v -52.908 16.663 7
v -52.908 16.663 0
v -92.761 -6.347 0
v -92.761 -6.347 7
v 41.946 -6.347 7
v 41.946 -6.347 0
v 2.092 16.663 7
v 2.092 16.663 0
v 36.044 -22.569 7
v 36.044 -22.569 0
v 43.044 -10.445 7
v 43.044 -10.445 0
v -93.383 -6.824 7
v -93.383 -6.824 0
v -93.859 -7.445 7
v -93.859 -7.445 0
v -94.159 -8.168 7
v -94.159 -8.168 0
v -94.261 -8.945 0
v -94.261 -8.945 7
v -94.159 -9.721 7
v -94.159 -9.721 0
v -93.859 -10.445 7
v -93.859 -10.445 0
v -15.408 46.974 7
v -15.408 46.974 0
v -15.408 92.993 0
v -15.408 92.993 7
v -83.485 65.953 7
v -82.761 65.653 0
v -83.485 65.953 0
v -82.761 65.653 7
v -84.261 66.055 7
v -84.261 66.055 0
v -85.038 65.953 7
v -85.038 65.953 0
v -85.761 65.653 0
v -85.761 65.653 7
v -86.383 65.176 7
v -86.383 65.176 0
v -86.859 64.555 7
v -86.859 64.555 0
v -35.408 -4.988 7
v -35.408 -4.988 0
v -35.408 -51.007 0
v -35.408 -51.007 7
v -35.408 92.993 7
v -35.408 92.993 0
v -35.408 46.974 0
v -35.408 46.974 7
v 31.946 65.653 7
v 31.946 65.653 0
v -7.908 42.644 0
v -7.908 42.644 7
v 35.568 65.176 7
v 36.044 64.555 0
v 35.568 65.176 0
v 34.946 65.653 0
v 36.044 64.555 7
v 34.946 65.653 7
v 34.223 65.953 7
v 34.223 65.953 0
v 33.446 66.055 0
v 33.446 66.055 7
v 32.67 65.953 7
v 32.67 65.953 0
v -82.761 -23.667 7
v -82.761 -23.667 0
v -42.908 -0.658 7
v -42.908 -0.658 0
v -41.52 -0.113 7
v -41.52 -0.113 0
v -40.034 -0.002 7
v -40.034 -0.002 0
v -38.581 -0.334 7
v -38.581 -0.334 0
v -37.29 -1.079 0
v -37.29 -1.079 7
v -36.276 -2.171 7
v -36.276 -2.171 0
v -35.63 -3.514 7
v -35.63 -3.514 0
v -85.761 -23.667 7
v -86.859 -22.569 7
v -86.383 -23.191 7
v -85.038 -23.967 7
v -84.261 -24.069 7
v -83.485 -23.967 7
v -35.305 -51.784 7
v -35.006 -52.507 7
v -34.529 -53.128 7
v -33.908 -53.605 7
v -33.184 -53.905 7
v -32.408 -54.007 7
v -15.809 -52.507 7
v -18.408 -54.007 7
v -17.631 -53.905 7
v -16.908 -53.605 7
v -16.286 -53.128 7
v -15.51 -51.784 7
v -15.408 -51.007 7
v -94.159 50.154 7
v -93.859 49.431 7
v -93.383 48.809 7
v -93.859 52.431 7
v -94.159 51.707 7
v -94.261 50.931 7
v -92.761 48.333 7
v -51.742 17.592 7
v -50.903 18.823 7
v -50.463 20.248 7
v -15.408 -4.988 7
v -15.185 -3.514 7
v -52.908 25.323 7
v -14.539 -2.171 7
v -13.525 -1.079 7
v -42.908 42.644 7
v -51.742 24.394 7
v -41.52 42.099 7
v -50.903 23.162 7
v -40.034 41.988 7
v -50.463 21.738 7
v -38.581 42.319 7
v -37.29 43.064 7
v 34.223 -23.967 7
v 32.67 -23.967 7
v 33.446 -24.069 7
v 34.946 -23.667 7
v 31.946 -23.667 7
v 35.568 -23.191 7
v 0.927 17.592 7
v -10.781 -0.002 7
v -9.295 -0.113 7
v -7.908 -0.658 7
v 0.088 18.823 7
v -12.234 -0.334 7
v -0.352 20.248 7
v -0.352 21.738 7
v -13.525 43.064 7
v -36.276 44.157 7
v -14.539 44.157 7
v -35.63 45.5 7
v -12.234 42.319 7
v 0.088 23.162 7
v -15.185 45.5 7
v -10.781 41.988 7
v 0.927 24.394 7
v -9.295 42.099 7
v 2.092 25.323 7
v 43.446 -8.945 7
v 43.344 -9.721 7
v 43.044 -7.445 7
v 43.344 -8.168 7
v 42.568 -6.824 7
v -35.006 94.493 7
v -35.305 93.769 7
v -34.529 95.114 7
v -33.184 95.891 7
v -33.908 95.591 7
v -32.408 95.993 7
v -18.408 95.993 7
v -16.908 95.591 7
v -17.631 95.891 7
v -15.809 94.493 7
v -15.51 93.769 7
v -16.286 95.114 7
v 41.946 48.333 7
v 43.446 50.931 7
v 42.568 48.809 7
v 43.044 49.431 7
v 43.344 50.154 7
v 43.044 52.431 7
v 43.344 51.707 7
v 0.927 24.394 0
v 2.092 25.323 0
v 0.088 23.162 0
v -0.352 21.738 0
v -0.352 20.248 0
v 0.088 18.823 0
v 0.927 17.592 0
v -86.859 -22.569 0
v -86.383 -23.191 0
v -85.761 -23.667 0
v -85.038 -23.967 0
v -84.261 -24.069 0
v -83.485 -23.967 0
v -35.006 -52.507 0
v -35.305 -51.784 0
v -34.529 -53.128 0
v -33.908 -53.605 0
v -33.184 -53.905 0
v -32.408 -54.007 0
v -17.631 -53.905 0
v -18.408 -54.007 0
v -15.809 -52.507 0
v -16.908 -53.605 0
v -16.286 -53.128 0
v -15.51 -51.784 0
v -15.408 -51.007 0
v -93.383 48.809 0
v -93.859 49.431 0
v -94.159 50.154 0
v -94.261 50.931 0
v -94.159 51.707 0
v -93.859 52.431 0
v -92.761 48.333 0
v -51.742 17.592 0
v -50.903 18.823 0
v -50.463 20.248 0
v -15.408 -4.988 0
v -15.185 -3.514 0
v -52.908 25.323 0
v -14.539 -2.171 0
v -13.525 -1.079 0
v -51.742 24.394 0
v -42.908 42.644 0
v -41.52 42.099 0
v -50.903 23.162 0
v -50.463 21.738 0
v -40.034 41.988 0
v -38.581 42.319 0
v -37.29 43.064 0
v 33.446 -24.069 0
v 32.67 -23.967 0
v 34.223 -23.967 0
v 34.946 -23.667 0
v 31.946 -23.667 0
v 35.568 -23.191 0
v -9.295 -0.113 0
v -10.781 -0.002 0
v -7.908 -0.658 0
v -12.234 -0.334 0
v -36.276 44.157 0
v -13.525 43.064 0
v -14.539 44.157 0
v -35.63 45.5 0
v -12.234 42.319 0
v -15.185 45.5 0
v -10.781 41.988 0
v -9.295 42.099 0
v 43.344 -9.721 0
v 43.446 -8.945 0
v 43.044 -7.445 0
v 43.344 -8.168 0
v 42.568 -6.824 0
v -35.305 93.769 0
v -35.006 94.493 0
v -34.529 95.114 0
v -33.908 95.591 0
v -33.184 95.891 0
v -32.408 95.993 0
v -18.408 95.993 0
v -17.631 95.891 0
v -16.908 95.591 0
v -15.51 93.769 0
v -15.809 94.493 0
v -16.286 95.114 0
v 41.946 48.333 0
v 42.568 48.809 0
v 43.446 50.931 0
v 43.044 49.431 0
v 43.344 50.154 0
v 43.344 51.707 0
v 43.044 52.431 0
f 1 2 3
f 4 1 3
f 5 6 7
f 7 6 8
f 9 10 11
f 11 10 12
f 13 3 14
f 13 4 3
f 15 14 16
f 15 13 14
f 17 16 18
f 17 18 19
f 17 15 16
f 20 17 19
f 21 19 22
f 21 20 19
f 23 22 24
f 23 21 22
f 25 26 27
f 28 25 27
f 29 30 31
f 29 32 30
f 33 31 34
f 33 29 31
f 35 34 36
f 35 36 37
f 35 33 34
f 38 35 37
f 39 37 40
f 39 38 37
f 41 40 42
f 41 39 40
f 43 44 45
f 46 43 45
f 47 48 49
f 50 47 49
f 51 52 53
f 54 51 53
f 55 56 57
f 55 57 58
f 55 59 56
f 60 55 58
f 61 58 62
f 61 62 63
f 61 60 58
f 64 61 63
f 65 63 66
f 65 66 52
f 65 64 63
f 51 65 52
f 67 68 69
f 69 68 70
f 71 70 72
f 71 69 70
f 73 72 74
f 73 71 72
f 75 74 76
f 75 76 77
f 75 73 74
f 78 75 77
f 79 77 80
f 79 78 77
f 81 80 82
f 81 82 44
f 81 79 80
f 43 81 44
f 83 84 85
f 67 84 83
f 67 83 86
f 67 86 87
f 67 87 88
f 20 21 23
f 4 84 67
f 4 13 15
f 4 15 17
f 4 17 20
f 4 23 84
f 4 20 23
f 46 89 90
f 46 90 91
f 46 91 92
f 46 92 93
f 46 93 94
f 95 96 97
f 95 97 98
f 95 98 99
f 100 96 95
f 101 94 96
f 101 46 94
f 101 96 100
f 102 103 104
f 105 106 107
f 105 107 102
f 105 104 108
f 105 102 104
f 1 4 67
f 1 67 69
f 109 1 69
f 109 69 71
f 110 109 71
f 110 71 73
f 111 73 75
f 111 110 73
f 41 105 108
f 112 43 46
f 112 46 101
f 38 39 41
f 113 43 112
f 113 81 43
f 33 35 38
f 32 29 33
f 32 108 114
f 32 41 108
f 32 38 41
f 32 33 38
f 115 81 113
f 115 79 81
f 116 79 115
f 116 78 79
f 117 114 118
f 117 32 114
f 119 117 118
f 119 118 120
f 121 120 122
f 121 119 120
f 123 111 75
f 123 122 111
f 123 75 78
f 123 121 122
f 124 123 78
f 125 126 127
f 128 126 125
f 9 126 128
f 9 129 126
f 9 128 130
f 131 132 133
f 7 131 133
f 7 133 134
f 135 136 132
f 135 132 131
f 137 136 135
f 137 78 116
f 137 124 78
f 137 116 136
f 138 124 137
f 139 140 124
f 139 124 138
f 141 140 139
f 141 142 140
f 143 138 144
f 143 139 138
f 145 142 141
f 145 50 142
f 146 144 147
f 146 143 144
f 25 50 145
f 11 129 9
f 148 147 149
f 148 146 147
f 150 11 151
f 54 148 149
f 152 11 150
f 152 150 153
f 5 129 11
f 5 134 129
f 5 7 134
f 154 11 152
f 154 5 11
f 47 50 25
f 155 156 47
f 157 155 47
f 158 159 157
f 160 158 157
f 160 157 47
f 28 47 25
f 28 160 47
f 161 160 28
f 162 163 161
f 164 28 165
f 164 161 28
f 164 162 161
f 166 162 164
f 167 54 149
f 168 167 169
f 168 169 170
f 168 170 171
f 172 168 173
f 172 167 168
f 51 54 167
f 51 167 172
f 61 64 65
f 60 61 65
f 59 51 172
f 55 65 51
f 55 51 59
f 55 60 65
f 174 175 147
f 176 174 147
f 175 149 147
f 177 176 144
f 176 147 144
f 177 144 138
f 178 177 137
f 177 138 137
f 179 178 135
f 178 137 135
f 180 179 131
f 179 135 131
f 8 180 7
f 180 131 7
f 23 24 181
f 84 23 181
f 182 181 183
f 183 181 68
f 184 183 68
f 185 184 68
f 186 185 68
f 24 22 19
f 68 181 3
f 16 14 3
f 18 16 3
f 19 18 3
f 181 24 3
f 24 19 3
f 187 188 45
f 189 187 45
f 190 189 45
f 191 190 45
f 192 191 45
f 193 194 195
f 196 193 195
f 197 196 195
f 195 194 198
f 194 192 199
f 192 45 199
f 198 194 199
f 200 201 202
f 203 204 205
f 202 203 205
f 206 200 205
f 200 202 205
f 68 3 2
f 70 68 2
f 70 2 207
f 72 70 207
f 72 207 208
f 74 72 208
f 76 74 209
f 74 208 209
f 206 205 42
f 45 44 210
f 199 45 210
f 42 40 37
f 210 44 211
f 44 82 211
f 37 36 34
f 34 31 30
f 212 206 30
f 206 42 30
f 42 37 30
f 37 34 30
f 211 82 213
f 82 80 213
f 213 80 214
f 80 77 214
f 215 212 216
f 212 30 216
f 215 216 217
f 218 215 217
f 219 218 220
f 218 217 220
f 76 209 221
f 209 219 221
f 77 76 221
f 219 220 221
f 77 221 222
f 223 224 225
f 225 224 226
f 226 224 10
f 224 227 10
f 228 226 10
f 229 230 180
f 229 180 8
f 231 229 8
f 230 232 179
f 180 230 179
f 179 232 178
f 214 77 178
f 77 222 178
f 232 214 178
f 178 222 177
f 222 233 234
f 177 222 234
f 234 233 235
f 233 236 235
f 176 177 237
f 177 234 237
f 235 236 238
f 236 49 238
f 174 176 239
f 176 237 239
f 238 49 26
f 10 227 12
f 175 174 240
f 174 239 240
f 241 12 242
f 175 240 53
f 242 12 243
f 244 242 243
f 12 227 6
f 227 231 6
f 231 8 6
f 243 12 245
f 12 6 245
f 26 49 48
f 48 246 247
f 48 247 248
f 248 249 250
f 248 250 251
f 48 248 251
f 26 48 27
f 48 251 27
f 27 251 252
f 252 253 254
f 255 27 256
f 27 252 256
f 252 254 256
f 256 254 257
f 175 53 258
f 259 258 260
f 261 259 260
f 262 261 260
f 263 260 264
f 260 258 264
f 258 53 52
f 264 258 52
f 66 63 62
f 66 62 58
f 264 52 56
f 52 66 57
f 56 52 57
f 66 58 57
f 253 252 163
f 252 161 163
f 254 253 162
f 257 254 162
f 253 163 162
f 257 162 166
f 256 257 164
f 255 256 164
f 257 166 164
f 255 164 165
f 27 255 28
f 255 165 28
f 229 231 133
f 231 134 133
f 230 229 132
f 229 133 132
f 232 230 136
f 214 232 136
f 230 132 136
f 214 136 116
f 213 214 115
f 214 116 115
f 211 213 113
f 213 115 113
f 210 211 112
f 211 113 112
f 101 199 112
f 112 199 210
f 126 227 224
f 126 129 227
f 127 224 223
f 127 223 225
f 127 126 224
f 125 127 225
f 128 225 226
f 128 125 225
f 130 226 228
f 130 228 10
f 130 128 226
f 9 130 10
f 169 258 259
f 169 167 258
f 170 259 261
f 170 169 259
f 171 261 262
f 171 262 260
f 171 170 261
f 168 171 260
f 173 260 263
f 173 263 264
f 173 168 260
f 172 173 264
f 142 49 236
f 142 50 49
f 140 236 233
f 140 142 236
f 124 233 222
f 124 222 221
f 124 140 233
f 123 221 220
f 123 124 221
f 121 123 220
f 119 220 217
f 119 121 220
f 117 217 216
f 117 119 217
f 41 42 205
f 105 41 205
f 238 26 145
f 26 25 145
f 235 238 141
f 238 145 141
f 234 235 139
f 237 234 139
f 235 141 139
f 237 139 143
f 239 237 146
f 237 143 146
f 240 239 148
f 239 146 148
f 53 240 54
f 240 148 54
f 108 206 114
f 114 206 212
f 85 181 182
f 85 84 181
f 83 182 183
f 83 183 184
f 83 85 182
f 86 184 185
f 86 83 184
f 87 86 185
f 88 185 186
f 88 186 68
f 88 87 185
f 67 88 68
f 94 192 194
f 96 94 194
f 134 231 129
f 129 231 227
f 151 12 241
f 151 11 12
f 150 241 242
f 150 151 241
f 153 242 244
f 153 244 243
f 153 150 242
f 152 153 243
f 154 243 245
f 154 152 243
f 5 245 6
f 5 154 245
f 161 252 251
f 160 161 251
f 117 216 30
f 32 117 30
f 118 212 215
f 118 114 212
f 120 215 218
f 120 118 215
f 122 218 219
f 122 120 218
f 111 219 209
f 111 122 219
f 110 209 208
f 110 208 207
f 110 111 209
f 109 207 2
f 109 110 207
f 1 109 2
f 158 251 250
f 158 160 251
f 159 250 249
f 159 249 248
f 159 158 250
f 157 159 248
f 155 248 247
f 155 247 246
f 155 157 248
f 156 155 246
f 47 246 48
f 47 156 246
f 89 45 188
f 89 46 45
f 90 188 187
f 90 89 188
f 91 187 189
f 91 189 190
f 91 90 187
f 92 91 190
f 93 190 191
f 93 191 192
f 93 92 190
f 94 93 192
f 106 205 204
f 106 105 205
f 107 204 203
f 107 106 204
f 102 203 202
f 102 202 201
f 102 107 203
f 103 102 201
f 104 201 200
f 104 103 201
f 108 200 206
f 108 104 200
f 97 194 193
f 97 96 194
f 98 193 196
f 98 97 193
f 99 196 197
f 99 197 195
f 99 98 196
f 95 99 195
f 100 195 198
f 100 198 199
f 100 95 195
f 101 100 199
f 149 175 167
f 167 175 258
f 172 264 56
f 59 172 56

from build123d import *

# Parameters (mm, degrees)
F1_DEPTH = 7
F2_R     = 3
F3_R     = 3
F4_R     = 5


with BuildPart() as f1:
    # F0 (on Top) → F1 (new body)
    with BuildSketch(Plane.XY):
        Polygon((-15.407504, 95.992884), (-35.407504, 95.992884), (-35.407504, 38.313392), (-85.35941, 67.153138), (-95.35941, 49.83263), (-45.407504, 20.992884), (-95.35941, -7.846862), (-85.35941, -25.16737), (-35.407504, 3.672376), (-35.407504, -54.007116), (-15.407504, -54.007116), (-15.407504, 3.672376), (34.544401, -25.16737), (44.544401, -7.846862), (-5.407504, 20.992884), (44.544401, 49.83263), (34.544401, 67.153138), (-15.407504, 38.313392), align=None)
    extrude(amount=F1_DEPTH)

    # F2
    f2_edges = [f1.edges().sort_by_distance(p)[0] for p in [
        (-35.407504, -54.007116, 3.5),
        (-15.407504, -54.007116, 3.5),
        (34.544401, -25.16737, 3.5),
        (44.544401, -7.846862, 3.5),
        (44.544401, 49.83263, 3.5),
        (34.544401, 67.153138, 3.5),
        (-85.35941, -25.16737, 3.5),
        (-95.35941, -7.846862, 3.5),
        (-85.35941, 67.153138, 3.5),
        (-95.35941, 49.83263, 3.5),
        (-35.407504, 95.992884, 3.5),
    ]]
    fillet(f2_edges, radius=F2_R)

    # F3
    f3_edges = [f1.edges().sort_by_distance(p)[0] for p in [
        (-15.407504, 95.992884, 3.5),
    ]]
    fillet(f3_edges, radius=F3_R)

    # F4
    f4_edges = [f1.edges().sort_by_distance(p)[0] for p in [
        (-35.407504, 38.313392, 3.5),
        (-15.407504, 38.313392, 3.5),
        (-5.407504, 20.992884, 3.5),
        (-45.407504, 20.992884, 3.5),
        (-35.407504, 3.672376, 3.5),
        (-15.407504, 3.672376, 3.5),
    ]]
    fillet(f4_edges, radius=F4_R)


solid = f1.part
